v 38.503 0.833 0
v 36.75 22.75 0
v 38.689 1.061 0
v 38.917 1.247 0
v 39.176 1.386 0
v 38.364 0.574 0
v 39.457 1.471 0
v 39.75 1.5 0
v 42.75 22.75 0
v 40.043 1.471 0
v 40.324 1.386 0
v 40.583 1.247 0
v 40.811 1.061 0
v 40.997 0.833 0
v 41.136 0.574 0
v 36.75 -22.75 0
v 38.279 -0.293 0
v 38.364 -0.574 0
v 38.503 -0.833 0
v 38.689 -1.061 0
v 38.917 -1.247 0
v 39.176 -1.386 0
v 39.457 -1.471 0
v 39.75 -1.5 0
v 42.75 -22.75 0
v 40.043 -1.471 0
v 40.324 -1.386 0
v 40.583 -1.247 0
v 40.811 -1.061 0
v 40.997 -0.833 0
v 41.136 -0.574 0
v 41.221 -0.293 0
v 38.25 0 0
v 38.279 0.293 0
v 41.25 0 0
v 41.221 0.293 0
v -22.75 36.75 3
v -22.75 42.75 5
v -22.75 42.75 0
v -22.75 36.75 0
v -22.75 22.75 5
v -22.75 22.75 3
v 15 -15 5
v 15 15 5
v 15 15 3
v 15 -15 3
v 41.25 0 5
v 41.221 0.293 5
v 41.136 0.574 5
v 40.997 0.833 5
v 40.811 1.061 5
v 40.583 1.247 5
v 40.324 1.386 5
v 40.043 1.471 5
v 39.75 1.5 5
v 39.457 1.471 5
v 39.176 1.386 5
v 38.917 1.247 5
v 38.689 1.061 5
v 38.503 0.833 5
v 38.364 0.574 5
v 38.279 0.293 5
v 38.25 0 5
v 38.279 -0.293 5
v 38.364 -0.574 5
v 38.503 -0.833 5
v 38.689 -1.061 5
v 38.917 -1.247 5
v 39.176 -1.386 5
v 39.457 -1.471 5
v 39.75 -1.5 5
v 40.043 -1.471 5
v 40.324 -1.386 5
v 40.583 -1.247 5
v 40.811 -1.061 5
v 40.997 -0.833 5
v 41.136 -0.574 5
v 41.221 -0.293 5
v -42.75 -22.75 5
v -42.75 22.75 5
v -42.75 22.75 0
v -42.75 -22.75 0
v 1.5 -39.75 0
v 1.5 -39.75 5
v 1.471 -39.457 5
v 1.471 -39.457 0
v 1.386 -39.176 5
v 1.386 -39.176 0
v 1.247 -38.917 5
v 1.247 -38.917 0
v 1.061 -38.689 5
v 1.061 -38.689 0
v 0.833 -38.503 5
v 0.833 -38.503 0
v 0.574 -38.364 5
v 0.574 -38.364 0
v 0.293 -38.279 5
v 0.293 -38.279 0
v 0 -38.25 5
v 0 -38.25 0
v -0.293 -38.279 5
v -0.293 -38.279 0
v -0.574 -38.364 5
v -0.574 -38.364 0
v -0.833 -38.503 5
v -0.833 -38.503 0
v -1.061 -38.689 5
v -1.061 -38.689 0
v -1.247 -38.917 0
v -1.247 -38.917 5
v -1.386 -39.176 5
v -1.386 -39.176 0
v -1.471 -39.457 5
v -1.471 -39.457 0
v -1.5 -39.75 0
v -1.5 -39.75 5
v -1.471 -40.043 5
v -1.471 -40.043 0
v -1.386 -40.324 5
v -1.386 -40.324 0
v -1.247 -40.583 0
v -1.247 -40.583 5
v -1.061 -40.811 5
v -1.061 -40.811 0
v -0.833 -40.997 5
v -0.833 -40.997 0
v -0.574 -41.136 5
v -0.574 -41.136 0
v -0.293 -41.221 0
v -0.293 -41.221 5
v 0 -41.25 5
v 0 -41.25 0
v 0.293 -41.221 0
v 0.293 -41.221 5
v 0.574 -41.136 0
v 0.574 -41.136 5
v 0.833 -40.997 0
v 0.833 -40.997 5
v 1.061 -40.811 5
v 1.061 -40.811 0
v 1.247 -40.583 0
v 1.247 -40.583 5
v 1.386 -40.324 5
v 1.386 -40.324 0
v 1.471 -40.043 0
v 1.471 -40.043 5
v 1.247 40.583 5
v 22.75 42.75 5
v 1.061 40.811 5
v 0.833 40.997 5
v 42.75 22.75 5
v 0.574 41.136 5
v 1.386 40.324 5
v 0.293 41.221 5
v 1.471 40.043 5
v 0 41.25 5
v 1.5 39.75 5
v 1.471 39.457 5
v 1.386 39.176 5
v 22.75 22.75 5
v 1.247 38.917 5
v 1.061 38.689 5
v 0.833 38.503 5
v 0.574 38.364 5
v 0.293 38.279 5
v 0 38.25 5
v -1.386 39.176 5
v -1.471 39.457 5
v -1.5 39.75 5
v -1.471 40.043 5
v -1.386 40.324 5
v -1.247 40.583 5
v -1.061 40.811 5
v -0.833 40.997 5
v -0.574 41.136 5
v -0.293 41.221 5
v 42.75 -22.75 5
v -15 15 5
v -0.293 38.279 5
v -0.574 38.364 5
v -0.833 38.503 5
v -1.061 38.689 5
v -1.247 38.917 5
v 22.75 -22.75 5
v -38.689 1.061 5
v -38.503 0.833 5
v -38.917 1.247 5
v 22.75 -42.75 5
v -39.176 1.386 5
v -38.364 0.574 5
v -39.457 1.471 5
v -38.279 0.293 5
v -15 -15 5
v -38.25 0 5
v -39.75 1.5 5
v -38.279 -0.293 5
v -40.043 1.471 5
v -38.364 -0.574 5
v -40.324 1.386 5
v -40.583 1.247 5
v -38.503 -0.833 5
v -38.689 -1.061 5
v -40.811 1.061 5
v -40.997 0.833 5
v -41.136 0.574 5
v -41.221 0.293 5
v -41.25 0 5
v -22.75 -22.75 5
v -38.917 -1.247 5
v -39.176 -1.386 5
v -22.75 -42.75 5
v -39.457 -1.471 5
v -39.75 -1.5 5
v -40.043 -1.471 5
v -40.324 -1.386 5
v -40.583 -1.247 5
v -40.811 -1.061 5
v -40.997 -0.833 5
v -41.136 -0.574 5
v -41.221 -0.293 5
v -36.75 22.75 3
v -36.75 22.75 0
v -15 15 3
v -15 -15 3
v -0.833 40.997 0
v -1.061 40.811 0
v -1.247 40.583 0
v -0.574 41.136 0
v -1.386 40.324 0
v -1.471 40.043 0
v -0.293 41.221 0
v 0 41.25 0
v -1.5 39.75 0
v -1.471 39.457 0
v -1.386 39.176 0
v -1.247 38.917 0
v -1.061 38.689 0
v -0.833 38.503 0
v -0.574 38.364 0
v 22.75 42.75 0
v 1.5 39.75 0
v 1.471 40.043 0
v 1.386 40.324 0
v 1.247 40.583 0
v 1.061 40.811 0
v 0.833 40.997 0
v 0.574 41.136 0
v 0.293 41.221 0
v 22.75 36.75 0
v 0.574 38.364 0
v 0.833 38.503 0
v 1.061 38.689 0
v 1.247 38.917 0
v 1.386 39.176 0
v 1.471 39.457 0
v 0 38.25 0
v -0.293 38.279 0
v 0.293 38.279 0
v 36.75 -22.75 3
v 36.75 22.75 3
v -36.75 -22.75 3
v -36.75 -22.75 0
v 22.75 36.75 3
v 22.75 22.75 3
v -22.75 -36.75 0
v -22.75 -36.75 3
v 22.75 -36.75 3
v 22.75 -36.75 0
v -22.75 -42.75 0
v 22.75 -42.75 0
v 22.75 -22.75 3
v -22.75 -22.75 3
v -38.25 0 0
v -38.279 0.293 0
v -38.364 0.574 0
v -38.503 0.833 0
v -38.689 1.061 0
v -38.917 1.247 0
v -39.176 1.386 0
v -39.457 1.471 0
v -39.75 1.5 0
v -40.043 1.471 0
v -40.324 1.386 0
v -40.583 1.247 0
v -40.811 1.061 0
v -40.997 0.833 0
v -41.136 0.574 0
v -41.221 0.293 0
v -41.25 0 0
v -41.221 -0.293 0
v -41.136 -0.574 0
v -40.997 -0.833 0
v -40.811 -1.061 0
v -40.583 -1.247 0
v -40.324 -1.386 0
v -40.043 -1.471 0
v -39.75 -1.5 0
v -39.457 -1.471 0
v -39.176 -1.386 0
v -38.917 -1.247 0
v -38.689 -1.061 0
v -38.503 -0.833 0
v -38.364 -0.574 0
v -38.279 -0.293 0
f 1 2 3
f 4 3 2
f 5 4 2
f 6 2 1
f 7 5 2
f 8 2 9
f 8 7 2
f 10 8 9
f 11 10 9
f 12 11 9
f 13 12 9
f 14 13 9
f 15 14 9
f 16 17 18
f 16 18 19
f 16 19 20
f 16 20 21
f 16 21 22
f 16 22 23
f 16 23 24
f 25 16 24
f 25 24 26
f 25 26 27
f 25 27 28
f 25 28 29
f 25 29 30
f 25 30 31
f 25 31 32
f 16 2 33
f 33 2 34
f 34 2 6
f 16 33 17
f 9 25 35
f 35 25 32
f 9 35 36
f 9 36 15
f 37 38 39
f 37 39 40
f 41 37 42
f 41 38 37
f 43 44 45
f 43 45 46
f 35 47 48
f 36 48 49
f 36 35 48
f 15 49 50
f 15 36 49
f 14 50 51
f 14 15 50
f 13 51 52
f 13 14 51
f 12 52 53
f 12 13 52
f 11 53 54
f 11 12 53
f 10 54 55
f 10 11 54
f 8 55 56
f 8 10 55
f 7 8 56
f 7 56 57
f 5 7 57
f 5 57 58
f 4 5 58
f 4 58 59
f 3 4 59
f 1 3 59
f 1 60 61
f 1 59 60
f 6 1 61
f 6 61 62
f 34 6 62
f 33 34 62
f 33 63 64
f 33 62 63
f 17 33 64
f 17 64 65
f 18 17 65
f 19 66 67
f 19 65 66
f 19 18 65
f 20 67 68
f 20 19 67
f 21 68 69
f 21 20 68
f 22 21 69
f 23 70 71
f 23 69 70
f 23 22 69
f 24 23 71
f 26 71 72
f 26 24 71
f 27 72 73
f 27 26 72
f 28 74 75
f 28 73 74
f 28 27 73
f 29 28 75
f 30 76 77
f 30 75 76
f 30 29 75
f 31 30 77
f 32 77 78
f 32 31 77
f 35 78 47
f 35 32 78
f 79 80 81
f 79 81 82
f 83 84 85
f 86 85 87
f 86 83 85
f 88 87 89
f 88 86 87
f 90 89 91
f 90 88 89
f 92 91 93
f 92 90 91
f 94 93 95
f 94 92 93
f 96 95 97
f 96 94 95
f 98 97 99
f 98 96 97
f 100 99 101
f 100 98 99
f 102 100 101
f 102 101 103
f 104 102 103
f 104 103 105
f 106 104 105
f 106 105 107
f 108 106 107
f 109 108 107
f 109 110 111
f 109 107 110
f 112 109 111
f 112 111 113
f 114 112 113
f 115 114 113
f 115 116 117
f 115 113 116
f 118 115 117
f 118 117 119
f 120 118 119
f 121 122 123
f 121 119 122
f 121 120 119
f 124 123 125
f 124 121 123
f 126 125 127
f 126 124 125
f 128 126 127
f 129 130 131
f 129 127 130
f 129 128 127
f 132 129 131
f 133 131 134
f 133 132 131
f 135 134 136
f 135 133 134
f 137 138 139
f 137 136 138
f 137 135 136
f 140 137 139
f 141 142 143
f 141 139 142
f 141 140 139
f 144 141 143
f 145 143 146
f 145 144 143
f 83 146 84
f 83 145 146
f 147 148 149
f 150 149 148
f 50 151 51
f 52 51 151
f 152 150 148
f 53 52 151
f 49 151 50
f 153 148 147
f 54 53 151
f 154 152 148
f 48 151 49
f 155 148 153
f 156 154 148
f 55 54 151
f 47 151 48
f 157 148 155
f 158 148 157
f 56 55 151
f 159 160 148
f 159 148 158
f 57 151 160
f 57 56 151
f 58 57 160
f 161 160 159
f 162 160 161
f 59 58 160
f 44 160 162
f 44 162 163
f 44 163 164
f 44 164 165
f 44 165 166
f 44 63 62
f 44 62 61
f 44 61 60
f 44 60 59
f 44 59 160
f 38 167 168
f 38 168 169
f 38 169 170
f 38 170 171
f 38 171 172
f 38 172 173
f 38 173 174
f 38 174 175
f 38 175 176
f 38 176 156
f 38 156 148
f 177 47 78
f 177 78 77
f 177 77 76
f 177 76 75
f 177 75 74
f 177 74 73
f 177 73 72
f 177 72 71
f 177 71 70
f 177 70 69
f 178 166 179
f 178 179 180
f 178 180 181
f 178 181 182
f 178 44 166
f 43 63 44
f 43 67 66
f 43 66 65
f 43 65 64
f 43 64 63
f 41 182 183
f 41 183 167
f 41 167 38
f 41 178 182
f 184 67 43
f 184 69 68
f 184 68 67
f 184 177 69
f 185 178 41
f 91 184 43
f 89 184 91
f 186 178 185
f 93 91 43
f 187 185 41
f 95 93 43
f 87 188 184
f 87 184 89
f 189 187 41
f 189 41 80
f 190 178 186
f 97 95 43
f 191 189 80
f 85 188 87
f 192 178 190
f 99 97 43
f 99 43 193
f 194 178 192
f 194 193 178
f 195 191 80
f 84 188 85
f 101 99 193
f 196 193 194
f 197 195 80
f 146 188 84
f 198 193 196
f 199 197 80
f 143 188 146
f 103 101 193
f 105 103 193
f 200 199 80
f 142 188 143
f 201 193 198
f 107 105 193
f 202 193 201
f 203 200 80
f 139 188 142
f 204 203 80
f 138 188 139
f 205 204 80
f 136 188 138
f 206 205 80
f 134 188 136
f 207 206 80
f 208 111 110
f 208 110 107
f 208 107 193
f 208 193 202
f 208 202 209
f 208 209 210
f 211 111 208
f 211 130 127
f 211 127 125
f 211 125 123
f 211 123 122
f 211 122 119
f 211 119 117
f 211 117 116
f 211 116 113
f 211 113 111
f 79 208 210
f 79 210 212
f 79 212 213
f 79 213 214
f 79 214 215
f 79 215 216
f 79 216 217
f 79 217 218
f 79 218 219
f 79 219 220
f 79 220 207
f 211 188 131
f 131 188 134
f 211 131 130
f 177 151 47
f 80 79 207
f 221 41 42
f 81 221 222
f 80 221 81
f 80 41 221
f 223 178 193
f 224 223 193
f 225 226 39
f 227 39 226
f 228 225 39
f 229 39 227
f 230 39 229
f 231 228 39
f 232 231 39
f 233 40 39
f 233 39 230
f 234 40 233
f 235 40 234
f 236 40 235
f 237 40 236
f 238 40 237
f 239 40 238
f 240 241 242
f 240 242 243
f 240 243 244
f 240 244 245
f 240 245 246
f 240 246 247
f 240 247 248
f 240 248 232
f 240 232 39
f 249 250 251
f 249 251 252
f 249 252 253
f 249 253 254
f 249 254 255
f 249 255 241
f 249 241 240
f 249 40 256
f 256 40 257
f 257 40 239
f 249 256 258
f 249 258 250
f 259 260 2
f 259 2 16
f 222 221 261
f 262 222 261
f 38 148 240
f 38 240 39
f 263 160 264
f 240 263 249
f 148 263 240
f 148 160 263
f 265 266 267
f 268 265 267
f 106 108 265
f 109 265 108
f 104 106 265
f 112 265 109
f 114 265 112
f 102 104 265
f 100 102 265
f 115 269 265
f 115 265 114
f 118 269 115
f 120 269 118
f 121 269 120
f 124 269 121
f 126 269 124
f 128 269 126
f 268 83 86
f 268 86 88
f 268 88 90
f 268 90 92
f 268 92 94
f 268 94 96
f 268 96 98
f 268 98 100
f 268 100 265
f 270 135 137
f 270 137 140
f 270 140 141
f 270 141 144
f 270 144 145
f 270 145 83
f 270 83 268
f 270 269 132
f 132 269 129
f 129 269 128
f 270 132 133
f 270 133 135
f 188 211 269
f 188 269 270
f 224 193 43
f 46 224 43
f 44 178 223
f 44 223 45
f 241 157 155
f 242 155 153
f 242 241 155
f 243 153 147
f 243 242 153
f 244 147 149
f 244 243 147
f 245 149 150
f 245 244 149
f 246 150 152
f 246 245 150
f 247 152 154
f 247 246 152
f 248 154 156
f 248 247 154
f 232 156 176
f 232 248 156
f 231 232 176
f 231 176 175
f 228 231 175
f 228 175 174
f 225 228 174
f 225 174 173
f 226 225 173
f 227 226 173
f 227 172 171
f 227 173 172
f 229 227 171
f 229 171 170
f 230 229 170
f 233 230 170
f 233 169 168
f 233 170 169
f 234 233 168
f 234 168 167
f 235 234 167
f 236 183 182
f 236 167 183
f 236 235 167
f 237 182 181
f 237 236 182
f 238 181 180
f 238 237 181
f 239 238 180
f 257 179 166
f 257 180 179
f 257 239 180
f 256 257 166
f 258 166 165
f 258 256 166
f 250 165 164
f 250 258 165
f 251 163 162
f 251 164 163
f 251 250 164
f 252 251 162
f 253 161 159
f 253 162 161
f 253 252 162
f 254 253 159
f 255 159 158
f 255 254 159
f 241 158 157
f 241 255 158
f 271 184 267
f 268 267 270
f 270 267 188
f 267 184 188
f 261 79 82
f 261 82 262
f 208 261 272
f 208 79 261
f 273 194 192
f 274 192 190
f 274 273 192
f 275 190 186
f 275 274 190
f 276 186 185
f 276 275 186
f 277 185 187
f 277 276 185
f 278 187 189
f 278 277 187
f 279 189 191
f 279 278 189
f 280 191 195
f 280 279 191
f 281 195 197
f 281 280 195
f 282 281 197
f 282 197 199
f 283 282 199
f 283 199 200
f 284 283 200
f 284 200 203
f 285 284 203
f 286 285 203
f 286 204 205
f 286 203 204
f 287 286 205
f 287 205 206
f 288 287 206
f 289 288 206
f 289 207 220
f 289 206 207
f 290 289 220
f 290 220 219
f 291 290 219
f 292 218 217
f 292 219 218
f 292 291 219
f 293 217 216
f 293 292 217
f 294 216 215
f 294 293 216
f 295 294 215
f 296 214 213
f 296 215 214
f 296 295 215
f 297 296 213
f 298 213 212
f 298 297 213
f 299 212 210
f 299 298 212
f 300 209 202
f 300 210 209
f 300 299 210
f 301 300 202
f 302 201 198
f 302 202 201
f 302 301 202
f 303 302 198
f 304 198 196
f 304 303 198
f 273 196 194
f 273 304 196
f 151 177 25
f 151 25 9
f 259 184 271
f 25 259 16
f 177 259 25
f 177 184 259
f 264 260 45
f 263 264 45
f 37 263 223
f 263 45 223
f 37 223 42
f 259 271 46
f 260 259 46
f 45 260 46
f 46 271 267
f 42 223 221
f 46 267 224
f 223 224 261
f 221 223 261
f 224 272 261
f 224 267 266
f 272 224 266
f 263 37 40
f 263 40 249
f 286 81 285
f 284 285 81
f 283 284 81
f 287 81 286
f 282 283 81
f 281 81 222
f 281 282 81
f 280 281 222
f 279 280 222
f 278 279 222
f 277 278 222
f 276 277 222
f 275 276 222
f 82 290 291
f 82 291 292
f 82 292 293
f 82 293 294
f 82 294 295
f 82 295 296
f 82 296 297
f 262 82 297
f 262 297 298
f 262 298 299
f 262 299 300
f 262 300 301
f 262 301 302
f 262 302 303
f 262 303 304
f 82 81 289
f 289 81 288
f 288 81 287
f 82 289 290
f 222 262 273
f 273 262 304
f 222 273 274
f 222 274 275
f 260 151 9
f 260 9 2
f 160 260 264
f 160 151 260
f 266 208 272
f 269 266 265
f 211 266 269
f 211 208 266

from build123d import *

# Parameters (mm, degrees)
SKETCH033_W             = 30
SKETCH033_H             = 30
PAD009008_DEPTH         = 2
SKETCH034_W             = 45.5
SKETCH034_H             = 6
SKETCH034_W_2           = 6
SKETCH034_H_2           = 45.5
PAD009009_DEPTH         = 3
SKETCH035_R             = 1.5
POCKET003006_DEPTH      = 0.001
POCKET003006_DEPTH_BACK = 5.001


with BuildPart() as part:
    # Sketch033 → Pad009008 (new body)
    with BuildSketch(Plane(origin=(0, 0, 5), x_dir=(1, 0, 0), z_dir=(0, 0, -1))):
        Polygon((-22.75, 42.75), (22.75, 42.75), (22.75, 22.75), (42.75, 22.75), (42.75, -22.75), (22.75, -22.75), (22.75, -42.75), (-22.75, -42.75), (-22.75, -22.75), (-42.75, -22.75), (-42.75, 22.75), (-22.75, 22.75), align=None)
        Rectangle(SKETCH033_W, SKETCH033_H, mode=Mode.SUBTRACT)
    extrude(amount=PAD009008_DEPTH)

    # Sketch034 → Pad009009 (join)
    with BuildSketch(Plane(origin=(0, 0, 3), x_dir=(1, 0, 0), z_dir=(0, 0, -1))):
        with Locations((0, 39.75)):
            Rectangle(SKETCH034_W, SKETCH034_H)
        with Locations((0, -39.75)):
            Rectangle(SKETCH034_W, SKETCH034_H)
        with Locations((-39.75, 0)):
            Rectangle(SKETCH034_W_2, SKETCH034_H_2)
        with Locations((39.75, 0)):
            Rectangle(SKETCH034_W_2, SKETCH034_H_2)
    extrude(amount=PAD009009_DEPTH)

    # Sketch035 → Pocket003006 (cut, two sides)
    with BuildSketch(Plane.XY) as pocket003006_sk:
        with Locations((-39.75, 0)):
            Circle(SKETCH035_R)
        with Locations((0, 39.75)):
            Circle(SKETCH035_R)
        with Locations((39.75, 0)):
            Circle(SKETCH035_R)
        with Locations((0, -39.75)):
            Circle(SKETCH035_R)
    extrude(amount=-POCKET003006_DEPTH, mode=Mode.SUBTRACT)
    extrude(pocket003006_sk.sketch, amount=POCKET003006_DEPTH_BACK, mode=Mode.SUBTRACT)


solid = part.part
